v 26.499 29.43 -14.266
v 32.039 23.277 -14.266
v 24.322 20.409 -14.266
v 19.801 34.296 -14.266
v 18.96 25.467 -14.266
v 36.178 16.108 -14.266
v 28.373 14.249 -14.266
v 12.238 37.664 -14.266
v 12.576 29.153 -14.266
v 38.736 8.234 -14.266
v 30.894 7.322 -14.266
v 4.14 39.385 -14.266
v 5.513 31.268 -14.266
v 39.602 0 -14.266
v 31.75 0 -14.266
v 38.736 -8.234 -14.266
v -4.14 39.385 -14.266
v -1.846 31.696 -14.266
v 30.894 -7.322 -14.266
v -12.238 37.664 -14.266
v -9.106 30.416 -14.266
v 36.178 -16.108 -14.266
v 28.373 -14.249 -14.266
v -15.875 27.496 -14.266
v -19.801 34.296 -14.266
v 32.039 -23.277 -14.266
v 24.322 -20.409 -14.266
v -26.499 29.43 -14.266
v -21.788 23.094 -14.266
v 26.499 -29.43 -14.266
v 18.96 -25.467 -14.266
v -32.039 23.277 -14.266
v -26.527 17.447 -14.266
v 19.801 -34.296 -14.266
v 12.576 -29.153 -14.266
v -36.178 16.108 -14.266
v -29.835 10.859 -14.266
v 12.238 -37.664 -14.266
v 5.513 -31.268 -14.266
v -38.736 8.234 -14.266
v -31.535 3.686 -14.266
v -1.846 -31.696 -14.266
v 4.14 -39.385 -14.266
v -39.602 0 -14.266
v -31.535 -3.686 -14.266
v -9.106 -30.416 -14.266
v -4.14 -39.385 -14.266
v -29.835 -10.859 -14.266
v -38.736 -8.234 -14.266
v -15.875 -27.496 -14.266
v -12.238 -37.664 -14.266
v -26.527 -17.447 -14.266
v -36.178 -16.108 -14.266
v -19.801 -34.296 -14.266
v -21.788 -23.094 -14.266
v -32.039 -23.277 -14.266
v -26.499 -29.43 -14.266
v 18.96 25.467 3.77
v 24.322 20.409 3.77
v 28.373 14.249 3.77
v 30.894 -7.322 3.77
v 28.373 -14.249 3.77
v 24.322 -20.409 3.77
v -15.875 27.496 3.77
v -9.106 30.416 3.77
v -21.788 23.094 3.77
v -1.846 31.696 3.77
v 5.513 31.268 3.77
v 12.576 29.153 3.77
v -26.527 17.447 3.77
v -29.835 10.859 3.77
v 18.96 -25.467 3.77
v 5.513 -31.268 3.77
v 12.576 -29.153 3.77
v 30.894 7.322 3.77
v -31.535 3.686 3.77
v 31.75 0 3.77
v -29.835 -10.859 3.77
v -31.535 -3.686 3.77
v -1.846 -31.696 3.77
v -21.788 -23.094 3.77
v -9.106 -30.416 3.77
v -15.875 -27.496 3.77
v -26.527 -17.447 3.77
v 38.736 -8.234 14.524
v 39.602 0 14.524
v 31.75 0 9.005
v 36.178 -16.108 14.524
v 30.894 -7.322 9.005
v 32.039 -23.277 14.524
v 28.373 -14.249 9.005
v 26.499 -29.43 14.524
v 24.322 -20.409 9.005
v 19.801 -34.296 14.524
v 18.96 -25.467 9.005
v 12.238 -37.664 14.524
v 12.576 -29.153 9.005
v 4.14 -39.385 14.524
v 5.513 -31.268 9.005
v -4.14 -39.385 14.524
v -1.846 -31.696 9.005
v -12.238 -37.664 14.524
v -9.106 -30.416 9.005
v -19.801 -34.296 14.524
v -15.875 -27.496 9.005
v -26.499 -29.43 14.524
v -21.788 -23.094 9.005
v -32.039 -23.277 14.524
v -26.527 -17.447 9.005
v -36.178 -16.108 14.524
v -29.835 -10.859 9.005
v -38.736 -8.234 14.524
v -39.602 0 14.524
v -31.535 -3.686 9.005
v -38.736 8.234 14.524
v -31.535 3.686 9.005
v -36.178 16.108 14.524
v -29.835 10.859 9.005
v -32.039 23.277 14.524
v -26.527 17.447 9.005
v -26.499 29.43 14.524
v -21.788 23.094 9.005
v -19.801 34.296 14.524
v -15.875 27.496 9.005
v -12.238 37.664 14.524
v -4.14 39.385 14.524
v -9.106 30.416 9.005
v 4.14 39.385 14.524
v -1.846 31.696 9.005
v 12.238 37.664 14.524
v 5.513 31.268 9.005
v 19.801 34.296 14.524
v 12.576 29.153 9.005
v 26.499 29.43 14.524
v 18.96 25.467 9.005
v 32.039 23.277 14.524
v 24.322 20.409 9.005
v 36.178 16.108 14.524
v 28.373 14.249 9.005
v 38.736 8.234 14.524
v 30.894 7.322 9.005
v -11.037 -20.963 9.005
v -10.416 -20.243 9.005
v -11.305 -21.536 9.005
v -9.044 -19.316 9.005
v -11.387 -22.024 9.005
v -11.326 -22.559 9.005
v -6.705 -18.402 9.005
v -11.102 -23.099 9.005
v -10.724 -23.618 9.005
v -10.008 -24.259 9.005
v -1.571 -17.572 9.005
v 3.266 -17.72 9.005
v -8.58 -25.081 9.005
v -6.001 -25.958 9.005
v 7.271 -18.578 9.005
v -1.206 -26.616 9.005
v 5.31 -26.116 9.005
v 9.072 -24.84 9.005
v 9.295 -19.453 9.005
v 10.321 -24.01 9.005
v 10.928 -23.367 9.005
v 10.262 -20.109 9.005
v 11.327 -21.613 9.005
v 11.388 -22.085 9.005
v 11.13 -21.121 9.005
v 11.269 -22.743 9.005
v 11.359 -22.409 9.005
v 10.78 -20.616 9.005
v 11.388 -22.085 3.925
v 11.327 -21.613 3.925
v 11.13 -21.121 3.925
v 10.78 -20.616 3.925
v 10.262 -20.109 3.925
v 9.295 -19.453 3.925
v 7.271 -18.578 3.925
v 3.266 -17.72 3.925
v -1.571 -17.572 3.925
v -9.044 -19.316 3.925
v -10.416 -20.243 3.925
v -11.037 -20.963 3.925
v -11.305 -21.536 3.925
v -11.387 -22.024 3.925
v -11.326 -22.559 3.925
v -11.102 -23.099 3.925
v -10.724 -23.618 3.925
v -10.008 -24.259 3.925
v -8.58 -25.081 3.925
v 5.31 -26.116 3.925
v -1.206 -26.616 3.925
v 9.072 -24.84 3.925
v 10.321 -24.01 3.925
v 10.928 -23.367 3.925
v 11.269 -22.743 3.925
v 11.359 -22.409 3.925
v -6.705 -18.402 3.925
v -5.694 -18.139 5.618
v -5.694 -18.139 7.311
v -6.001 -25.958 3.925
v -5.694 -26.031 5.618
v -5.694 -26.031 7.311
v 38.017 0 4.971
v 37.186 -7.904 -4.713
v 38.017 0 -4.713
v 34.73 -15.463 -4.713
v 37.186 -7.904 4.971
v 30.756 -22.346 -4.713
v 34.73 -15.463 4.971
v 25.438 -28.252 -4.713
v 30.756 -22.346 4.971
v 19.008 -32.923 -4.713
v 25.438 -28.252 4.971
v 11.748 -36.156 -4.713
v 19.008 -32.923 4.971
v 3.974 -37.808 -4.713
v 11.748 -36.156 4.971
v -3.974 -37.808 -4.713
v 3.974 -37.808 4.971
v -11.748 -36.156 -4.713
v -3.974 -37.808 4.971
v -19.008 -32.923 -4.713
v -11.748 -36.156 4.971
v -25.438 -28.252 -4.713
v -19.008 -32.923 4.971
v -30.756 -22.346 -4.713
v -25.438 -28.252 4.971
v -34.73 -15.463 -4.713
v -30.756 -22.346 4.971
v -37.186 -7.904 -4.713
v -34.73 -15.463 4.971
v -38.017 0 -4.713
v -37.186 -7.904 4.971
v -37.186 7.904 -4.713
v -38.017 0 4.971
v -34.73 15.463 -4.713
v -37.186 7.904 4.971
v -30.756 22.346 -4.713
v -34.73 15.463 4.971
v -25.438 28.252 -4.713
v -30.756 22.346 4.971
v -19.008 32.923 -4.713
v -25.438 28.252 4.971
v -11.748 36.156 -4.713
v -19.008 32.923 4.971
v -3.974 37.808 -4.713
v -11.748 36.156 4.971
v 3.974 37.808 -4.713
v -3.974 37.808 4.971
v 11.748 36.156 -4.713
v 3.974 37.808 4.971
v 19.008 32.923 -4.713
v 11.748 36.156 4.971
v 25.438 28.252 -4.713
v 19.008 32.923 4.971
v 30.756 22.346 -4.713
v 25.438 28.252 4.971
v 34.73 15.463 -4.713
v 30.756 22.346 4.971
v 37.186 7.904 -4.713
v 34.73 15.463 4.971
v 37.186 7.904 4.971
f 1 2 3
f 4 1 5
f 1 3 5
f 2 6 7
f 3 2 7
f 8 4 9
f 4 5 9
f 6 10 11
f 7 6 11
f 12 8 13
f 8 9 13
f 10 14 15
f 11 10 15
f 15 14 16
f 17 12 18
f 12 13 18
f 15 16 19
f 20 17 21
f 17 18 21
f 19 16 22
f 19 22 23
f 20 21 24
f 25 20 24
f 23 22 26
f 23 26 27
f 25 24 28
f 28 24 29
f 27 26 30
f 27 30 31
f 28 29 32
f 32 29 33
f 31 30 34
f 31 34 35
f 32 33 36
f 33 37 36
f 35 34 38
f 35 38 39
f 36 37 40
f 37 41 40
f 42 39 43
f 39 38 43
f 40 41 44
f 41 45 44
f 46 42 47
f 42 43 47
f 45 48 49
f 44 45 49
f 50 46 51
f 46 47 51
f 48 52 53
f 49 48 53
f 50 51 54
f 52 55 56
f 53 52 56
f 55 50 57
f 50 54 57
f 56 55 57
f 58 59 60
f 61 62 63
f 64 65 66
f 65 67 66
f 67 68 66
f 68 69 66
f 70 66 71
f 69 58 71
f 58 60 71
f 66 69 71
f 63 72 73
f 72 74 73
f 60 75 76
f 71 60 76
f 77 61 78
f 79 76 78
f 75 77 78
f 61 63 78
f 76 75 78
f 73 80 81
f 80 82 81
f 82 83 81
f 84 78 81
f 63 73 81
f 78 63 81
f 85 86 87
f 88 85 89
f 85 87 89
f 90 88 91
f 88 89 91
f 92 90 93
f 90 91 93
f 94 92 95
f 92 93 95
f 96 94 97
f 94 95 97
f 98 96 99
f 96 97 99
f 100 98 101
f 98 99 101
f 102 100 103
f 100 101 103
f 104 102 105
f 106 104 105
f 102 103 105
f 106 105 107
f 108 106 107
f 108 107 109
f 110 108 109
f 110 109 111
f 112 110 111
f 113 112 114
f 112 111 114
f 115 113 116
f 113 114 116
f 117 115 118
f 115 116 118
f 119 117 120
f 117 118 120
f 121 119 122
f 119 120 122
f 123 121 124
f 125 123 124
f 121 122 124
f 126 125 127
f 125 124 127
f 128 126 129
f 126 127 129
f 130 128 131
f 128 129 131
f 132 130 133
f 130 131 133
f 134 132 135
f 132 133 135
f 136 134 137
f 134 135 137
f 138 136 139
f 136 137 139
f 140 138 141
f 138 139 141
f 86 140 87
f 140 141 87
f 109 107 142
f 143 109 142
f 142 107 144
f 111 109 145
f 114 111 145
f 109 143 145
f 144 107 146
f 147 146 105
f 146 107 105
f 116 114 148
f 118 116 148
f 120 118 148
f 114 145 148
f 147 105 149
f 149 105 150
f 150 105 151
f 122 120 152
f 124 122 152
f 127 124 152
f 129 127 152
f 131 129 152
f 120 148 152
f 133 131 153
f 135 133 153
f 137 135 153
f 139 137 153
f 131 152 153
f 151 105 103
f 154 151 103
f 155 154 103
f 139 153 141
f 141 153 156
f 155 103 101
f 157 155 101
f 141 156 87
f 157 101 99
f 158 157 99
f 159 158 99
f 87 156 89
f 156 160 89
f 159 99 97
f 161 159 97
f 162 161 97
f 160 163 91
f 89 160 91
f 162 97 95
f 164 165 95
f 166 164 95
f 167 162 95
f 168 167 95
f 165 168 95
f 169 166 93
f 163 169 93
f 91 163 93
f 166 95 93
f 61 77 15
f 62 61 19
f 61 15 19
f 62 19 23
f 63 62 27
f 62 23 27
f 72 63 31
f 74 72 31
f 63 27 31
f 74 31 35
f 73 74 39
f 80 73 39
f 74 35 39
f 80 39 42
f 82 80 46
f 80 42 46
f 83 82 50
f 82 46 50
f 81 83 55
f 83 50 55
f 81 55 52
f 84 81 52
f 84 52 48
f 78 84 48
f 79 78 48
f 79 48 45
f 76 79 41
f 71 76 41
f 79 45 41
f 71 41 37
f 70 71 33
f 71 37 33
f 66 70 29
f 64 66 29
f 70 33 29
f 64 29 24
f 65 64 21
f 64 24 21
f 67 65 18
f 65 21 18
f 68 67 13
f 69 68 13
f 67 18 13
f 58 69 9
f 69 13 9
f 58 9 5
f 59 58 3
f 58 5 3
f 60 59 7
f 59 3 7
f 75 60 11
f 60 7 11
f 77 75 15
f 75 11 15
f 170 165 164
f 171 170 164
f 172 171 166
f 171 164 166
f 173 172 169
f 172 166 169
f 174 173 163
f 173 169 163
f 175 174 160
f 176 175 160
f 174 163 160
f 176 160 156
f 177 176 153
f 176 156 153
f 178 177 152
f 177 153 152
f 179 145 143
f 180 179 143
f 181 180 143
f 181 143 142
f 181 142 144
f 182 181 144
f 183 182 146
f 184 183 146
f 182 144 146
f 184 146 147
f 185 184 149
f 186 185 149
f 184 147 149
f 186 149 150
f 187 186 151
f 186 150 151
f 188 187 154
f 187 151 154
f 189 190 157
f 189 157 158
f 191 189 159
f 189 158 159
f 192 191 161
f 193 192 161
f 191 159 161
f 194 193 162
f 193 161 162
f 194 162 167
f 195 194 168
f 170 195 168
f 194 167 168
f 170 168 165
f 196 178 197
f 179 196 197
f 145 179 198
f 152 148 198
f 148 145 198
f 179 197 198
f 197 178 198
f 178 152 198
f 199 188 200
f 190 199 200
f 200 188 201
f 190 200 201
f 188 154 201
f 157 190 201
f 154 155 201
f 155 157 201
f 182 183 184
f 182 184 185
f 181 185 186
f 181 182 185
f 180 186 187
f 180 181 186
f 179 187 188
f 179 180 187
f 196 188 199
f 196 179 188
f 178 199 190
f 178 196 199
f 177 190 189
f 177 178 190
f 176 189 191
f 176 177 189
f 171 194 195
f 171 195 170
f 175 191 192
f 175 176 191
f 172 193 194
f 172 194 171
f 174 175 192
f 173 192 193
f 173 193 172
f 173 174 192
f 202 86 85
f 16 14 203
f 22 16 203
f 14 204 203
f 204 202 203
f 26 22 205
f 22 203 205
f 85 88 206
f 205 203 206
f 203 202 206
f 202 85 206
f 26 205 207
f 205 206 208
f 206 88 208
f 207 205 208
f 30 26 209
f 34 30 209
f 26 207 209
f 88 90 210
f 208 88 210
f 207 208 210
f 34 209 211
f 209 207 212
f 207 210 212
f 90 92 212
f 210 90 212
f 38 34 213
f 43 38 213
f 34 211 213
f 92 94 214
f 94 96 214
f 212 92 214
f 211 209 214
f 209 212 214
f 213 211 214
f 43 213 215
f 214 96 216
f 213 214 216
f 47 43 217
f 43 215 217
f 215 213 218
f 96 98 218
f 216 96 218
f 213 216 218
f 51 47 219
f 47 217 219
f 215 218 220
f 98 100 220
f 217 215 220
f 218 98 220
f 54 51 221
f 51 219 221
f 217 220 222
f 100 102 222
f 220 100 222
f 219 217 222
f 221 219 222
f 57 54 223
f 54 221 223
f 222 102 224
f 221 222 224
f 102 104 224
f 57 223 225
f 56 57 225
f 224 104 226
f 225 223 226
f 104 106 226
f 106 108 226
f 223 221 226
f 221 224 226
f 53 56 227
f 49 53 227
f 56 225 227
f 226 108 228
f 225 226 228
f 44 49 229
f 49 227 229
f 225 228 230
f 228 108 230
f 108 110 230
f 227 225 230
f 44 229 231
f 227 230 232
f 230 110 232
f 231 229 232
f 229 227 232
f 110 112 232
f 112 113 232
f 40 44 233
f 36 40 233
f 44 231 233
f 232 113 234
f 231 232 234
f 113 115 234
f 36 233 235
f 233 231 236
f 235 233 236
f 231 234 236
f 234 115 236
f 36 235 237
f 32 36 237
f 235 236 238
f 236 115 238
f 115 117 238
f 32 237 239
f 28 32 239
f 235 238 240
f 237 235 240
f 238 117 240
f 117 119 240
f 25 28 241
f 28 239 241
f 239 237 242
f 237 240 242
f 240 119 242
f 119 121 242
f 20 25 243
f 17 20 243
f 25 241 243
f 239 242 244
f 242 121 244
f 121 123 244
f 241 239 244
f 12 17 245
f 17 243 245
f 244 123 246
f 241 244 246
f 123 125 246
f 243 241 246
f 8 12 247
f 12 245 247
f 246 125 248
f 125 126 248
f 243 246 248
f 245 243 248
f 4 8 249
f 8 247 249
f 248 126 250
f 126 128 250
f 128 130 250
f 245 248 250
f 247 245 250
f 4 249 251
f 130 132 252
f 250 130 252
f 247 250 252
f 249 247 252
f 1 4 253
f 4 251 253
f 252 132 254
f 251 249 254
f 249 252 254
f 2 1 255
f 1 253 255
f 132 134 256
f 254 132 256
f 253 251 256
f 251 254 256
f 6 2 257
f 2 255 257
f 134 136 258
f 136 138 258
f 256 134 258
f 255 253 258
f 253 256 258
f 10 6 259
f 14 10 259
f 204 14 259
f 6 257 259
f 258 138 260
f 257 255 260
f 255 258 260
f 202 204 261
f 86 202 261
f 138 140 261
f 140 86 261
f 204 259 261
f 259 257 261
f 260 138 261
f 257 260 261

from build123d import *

# Parameters (mm, degrees)
F3_DEPTH = 5.08


with BuildPart() as f1:
    # F0 (on Front) → F1 (revolve)
    with BuildSketch(Plane.XZ):
        with BuildLine():
            ThreePointArc((39.601862, -14.266361), (37.817378, 0.128719), (39.601862, 14.523798))
            Line((39.601862, 14.523798), (31.75, 9.004717))
            Line((31.75, 9.004717), (0, 9.004717))
            Line((0, 9.004717), (0, 3.770143))
            Line((0, 3.770143), (31.75, 3.770143))
            Line((31.75, 3.770143), (31.75, -14.266361))
            Line((31.75, -14.266361), (39.601862, -14.266361))
        make_face()
    revolve(axis=Axis((0, 0, 0.128719), (0, 0, -1)))

    # F2 (on face) → F3 (cut)
    with BuildSketch(Plane.XY.offset(9.004717)):
        with BuildLine():
            add(Edge.make_bspline(
                [(11.387902, -22.085052), (11.387902, -14.192679), (-5.693951, -18.138866), (-22.775805, -22.085052), (-5.693951, -26.031238), (11.387902, -29.977425), (11.387902, -22.085052)],
                knots=[0, 0, 0, 2.094395, 2.094395, 4.18879, 4.18879, 6.283185, 6.283185, 6.283185], degree=2, weights=[1, 0.5, 1, 0.5, 1, 0.5, 1]))
        make_face()
    extrude(amount=-F3_DEPTH, mode=Mode.SUBTRACT)


solid = f1.part
